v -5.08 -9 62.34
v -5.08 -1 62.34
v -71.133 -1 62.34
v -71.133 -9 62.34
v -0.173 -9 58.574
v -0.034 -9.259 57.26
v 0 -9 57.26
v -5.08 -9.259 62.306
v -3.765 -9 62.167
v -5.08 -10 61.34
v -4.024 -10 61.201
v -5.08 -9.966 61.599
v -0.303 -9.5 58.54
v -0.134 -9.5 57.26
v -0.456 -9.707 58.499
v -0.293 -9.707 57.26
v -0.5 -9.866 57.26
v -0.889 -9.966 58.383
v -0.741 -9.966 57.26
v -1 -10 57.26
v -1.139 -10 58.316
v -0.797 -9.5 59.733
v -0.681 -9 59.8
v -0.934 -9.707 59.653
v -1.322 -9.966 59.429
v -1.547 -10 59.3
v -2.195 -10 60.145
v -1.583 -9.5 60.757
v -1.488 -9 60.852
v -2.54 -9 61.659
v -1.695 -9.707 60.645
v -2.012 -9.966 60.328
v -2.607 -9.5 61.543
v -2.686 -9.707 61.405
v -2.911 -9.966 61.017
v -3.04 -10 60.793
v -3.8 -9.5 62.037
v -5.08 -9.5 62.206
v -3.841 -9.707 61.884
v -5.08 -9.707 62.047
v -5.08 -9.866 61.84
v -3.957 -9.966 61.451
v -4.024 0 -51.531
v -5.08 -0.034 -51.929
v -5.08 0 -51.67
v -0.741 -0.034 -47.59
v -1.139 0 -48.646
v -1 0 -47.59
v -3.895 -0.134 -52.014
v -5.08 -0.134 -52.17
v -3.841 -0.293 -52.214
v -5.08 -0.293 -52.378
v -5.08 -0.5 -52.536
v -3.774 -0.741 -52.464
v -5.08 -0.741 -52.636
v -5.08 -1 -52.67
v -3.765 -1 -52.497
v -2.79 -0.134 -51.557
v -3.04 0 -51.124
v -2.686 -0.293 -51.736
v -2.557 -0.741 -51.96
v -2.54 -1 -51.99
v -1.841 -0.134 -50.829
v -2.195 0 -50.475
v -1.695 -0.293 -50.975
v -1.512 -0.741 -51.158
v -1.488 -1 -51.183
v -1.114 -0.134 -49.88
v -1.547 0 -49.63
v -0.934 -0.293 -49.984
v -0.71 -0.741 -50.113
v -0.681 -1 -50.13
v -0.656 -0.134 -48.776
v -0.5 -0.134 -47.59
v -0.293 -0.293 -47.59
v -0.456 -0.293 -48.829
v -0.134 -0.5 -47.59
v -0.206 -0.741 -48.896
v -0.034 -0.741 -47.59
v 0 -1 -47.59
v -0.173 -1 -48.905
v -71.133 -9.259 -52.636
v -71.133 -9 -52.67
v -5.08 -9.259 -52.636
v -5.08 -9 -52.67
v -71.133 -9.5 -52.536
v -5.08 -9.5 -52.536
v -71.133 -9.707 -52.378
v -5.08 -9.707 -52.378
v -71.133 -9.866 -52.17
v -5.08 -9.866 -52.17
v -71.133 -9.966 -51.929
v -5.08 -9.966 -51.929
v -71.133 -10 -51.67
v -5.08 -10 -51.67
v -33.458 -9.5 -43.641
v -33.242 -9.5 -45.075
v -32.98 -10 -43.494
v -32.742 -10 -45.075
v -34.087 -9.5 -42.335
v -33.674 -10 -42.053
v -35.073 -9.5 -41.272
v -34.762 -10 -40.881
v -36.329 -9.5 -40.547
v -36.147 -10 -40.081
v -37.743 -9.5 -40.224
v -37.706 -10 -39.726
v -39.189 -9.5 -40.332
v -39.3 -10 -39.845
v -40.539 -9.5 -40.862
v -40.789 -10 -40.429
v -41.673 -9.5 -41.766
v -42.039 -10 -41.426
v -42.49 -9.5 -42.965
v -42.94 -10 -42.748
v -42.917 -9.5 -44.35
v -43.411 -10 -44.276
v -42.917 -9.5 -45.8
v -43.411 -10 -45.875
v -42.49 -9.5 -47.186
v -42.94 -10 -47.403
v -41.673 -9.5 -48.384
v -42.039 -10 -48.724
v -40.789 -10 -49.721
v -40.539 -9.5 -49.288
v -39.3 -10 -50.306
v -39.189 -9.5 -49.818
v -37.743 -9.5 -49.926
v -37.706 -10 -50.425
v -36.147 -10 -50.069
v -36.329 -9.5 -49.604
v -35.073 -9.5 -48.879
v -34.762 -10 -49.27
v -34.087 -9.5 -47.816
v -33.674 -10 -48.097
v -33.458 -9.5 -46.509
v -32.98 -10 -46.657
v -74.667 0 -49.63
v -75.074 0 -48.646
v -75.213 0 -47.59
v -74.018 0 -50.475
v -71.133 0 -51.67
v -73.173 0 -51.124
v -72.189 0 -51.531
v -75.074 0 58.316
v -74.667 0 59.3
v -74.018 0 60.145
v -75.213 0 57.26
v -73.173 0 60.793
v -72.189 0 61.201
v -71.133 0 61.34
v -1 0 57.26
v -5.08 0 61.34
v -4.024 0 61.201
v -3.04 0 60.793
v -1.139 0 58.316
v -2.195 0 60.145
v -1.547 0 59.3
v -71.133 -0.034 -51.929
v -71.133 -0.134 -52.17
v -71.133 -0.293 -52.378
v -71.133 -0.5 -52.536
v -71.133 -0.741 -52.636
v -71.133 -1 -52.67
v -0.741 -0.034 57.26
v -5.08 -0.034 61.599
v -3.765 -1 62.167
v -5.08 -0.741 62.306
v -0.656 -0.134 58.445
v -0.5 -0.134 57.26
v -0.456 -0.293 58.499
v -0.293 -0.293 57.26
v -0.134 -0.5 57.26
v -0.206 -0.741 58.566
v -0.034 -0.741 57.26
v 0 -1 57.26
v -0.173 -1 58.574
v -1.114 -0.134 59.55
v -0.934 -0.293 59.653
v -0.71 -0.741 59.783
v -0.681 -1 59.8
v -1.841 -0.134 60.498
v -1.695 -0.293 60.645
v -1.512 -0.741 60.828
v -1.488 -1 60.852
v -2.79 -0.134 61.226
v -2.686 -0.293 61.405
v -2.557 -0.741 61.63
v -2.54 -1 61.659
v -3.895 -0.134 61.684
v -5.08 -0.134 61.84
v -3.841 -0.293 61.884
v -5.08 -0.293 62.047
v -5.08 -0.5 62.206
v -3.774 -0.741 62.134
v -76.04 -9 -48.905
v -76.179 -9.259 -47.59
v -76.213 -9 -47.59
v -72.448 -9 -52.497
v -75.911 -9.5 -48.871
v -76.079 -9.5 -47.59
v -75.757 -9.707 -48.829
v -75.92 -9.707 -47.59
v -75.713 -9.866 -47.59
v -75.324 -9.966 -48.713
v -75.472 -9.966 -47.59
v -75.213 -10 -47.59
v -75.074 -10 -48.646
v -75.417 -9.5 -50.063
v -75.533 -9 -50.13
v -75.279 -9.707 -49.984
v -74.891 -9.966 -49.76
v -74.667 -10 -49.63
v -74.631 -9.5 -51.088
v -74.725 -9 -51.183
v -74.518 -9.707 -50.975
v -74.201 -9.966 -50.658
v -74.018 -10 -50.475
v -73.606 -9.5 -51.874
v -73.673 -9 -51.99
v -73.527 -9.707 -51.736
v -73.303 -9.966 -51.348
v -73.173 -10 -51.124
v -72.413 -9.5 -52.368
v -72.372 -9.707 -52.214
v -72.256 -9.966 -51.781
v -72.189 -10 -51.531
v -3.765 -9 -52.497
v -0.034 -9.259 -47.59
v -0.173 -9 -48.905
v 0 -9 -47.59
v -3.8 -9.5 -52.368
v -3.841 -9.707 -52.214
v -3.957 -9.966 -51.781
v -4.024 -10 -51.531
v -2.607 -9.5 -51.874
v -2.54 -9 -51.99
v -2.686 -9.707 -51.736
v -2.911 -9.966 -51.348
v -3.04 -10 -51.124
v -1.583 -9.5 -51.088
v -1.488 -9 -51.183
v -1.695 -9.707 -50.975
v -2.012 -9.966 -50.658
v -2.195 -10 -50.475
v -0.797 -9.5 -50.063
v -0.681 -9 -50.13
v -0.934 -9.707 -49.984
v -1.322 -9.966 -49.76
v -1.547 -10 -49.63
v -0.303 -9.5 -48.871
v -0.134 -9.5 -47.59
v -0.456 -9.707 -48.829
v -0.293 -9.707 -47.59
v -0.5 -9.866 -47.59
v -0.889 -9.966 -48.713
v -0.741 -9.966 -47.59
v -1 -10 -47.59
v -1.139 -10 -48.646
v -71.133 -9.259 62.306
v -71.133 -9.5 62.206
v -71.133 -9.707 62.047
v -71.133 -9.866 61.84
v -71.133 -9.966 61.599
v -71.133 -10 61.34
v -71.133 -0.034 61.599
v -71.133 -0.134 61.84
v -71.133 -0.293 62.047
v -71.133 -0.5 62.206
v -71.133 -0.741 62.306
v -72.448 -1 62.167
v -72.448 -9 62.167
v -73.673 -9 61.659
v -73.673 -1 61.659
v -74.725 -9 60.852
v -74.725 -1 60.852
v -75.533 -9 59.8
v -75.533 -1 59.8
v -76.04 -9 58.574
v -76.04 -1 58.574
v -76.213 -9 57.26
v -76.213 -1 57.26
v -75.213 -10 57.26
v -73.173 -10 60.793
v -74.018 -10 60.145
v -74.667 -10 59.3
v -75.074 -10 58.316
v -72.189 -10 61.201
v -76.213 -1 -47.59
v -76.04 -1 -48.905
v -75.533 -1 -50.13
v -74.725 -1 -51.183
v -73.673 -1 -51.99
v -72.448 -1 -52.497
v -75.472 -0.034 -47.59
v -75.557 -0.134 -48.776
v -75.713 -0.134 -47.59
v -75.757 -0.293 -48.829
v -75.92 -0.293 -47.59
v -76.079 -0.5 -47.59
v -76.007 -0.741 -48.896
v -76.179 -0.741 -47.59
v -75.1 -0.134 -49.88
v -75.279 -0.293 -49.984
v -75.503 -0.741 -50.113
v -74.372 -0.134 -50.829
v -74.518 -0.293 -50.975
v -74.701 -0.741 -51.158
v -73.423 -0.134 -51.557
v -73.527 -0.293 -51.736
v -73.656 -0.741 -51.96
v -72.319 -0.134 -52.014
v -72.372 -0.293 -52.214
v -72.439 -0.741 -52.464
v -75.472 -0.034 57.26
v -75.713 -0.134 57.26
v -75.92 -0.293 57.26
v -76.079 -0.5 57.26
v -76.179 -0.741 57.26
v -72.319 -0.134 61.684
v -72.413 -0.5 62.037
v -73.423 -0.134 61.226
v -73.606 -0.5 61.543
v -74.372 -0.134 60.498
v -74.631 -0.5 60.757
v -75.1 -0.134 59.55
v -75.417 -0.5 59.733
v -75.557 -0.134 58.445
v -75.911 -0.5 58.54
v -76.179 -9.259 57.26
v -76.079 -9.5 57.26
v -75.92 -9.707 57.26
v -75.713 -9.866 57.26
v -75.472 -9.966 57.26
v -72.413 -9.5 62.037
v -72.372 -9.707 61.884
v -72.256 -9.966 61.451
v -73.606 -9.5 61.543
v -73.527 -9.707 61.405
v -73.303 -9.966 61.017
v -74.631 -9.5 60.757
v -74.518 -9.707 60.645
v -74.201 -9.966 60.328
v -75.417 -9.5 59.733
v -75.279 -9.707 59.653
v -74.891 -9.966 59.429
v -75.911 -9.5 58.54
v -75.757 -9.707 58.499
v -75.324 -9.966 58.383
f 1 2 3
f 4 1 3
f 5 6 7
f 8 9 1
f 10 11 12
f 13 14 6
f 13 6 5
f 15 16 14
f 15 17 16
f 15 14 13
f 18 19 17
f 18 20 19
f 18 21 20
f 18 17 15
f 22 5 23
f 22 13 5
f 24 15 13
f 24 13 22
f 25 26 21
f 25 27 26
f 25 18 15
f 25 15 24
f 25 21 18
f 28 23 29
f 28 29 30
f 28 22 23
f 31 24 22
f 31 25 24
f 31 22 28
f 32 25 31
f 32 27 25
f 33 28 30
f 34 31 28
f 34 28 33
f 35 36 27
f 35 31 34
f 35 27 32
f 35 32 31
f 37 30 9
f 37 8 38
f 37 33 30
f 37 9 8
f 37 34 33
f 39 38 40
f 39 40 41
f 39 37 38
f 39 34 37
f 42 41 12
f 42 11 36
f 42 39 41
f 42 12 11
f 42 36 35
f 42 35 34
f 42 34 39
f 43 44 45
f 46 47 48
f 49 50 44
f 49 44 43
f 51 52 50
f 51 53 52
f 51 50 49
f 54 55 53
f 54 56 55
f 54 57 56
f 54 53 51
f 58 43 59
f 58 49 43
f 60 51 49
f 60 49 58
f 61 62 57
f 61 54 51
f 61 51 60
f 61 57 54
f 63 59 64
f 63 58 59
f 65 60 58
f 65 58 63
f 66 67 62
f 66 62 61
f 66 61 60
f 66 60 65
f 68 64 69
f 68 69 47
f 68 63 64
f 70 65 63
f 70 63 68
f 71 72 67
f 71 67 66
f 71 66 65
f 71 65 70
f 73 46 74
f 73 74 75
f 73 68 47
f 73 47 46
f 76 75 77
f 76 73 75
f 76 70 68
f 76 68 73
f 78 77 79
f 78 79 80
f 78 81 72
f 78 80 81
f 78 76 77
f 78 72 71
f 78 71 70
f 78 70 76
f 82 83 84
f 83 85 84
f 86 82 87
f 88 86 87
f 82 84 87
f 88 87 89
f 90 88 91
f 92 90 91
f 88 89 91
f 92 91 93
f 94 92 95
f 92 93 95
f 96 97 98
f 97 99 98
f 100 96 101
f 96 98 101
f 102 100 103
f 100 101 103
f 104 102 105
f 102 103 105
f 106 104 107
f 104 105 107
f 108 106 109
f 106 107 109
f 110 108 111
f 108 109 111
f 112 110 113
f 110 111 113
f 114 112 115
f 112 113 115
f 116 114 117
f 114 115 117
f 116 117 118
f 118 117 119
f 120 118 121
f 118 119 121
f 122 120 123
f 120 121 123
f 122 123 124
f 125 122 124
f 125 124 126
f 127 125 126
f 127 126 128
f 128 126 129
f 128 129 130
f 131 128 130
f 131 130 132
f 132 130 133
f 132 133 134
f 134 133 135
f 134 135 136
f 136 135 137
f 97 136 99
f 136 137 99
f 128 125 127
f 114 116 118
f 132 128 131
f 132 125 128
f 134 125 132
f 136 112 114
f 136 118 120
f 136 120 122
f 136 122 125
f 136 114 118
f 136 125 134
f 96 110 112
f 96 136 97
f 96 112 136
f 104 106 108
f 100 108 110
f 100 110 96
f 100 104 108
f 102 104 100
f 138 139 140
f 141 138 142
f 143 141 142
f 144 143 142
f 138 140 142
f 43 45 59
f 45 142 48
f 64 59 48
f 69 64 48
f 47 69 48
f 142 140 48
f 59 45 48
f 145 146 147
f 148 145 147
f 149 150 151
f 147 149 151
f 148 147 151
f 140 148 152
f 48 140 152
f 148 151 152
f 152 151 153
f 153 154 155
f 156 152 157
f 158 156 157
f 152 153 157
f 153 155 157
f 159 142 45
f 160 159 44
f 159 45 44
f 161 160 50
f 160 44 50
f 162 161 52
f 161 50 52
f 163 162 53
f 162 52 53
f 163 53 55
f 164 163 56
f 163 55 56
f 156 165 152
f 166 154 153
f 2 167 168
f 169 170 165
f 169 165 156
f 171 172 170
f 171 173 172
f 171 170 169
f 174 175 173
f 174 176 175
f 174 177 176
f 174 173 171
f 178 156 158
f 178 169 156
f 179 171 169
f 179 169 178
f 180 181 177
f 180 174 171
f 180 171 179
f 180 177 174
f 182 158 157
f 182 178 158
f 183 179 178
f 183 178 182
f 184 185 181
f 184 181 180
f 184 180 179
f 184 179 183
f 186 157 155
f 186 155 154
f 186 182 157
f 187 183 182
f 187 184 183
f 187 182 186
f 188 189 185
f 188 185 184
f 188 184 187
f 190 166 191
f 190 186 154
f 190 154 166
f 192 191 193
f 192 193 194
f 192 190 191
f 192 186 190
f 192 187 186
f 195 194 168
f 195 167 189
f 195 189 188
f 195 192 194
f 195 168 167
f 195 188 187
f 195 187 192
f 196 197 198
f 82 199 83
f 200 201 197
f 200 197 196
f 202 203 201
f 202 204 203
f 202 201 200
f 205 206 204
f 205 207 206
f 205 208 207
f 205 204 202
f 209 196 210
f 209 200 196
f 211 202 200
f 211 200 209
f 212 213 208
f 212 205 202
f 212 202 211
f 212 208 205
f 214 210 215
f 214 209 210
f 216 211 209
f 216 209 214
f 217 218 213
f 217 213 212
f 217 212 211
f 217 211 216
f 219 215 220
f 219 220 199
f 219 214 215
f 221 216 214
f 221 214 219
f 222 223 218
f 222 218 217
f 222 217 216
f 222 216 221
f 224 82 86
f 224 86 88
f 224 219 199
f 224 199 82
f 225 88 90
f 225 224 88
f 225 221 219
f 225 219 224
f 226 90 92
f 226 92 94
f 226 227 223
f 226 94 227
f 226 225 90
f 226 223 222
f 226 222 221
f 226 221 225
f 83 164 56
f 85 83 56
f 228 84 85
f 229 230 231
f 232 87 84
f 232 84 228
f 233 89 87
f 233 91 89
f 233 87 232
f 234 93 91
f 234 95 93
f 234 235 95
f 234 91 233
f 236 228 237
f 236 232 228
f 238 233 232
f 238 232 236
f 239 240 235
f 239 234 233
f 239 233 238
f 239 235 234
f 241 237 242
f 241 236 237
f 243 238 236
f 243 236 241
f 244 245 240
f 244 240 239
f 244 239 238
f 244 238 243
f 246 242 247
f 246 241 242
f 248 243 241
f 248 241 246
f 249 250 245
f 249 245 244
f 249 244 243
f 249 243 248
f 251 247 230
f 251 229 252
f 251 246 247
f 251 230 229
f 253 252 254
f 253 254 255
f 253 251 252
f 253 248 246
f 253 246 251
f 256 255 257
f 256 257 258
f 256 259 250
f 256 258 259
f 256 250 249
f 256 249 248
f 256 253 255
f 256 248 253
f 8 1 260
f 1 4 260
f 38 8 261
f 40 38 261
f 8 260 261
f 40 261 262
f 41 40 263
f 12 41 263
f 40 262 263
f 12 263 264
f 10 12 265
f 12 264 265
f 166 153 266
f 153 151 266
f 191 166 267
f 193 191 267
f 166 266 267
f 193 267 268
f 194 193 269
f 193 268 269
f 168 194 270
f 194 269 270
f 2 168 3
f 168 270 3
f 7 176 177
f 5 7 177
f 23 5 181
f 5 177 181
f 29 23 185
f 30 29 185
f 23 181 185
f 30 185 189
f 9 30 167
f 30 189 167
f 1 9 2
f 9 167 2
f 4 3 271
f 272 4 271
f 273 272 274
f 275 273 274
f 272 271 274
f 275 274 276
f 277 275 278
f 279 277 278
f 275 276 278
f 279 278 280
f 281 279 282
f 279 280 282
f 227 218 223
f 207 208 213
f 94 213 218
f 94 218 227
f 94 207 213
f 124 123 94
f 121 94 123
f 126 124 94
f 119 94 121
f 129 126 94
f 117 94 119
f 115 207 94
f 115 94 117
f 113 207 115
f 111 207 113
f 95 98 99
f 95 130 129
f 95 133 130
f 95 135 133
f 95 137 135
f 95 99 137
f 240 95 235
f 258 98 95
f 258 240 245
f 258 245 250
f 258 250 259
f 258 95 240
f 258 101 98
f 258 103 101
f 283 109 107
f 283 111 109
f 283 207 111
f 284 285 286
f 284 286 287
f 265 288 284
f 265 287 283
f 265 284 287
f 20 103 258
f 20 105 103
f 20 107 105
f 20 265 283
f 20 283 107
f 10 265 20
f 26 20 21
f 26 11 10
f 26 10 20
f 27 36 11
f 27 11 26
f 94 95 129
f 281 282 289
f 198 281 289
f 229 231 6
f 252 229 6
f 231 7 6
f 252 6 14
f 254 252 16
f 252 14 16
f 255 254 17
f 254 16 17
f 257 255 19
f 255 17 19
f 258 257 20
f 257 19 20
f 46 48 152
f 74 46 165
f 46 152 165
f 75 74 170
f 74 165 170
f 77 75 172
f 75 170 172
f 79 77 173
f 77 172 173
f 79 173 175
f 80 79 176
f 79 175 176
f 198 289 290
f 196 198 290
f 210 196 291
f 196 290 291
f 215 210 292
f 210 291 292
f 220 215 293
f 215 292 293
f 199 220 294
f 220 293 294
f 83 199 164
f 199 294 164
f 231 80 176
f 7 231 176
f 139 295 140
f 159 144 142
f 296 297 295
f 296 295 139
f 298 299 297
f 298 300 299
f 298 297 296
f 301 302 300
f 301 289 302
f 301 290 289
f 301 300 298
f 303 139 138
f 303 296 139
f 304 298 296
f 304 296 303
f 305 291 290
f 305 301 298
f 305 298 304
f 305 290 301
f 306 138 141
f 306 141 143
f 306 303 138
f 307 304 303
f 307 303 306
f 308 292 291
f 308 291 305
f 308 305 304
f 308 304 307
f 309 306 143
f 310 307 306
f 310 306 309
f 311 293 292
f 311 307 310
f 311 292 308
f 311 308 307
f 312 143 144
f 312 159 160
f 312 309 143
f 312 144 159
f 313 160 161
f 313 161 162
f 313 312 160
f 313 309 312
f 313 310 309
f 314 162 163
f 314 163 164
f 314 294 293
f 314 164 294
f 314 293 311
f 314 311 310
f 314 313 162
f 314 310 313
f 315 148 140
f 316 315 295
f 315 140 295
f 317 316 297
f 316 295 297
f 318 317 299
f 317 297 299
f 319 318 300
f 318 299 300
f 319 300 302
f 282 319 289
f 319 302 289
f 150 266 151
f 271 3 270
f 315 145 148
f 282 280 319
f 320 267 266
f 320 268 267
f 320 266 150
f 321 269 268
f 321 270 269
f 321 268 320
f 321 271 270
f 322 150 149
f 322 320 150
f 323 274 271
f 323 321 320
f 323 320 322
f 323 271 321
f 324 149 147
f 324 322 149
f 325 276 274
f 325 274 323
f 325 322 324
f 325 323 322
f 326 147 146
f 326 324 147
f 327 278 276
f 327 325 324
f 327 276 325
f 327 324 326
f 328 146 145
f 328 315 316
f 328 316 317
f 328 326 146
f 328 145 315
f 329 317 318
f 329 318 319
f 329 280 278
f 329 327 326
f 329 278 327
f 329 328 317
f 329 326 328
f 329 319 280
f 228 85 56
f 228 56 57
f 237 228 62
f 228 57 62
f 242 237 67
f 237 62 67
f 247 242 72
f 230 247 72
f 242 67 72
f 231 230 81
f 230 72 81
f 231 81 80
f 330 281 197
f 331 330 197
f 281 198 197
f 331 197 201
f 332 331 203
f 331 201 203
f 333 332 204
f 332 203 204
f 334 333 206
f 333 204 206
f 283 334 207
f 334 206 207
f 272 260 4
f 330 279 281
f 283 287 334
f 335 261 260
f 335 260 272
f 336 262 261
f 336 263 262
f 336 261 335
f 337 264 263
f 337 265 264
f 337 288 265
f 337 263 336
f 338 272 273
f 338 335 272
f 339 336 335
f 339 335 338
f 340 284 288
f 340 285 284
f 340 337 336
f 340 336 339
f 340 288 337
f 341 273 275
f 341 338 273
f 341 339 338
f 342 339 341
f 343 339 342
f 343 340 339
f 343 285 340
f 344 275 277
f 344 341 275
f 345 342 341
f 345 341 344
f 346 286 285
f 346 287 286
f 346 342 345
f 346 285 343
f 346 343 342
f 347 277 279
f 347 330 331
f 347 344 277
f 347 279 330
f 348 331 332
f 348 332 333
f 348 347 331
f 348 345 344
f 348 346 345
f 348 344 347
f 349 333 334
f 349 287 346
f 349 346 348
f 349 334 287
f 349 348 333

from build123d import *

# Parameters (mm, degrees)
F0_R     = 5.4921588255
F1_DEPTH = 10
F0_R_2   = 4.8647477
F2_DEPTH = 10
F3_SIZE  = 0.5
F4_DEPTH = 9.5
F5_R     = 1


with BuildPart() as f1:
    # F0 (on Front) → F1 (new body)
    with BuildSketch(Plane.XZ):
        with BuildLine():
            Line((-5.08, 62.3396973443), (-71.1331922889, 62.3396973443))
            ThreePointArc((-71.1331922889, 62.3396973443), (-74.7252947373, 60.8517997927), (-76.2131922889, 57.2596973443))
            Line((-76.2131922889, 57.2596973443), (-76.2131922889, -47.5904377484))
            ThreePointArc((-76.2131922889, -47.5904377484), (-74.7252947373, -51.1825401969), (-71.1331922889, -52.6704377484))
            Line((-71.1331922889, -52.6704377484), (-5.08, -52.6704377484))
            ThreePointArc((-5.08, -52.6704377484), (-1.4878975516, -51.1825401969), (0, -47.5904377484))
            Line((0, -47.5904377484), (0, 57.2596973443))
            ThreePointArc((0, 57.2596973443), (-1.4878975516, 60.8517997927), (-5.08, 62.3396973443))
        make_face()
        with Locations((-38.1065961444, -45.075263828)):
            Circle(F0_R, mode=Mode.SUBTRACT)
        with BuildLine():
            ThreePointArc((-68.5931922889, 44.5596973443), (-67.8492435131, 46.3557485685), (-66.0531922889, 47.0996973443))
            Line((-66.0531922889, 47.0996973443), (-10.16, 47.0996973443))
            ThreePointArc((-10.16, 47.0996973443), (-8.3639487758, 46.3557485685), (-7.62, 44.5596973443))
            Line((-7.62, 44.5596973443), (-7.62, -34.8904377484))
            ThreePointArc((-7.62, -34.8904377484), (-8.3639487758, -36.6864889726), (-10.16, -37.4304377484))
            Line((-10.16, -37.4304377484), (-66.0531922889, -37.4304377484))
            ThreePointArc((-66.0531922889, -37.4304377484), (-67.8492435131, -36.6864889726), (-68.5931922889, -34.8904377484))
            Line((-68.5931922889, -34.8904377484), (-68.5931922889, 44.5596973443))
        make_face(mode=Mode.SUBTRACT)
        with BuildLine():
            Line((-10.16, 47.0996973443), (-66.0531922889, 47.0996973443))
            ThreePointArc((-66.0531922889, 47.0996973443), (-67.8492435131, 46.3557485685), (-68.5931922889, 44.5596973443))
            Line((-68.5931922889, 44.5596973443), (-68.5931922889, -34.8904377484))
            ThreePointArc((-68.5931922889, -34.8904377484), (-67.8492435131, -36.6864889726), (-66.0531922889, -37.4304377484))
            Line((-66.0531922889, -37.4304377484), (-10.16, -37.4304377484))
            ThreePointArc((-10.16, -37.4304377484), (-8.3639487758, -36.6864889726), (-7.62, -34.8904377484))
            Line((-7.62, -34.8904377484), (-7.62, 44.5596973443))
            ThreePointArc((-7.62, 44.5596973443), (-8.3639487758, 46.3557485685), (-10.16, 47.0996973443))
        make_face()
    extrude(amount=F1_DEPTH)

    # F0 (on Front) → F2 (join)
    with BuildSketch(Plane.XZ):
        with Locations((-38.1065961444, -45.075263828)):
            Circle(F0_R)
        with Locations((-38.1065961444, -45.075263828)):
            Circle(F0_R_2, mode=Mode.SUBTRACT)
    extrude(amount=F2_DEPTH)

    # F3
    f3_edges = [f1.edges().sort_by_distance(p)[0] for p in [
        (-42.971344, -10, -45.075264),
    ]]
    chamfer(f3_edges, length=F3_SIZE)

    # F0 (on Front) → F4 (join)
    with BuildSketch(Plane.XZ):
        with Locations((-38.1065961444, -45.075263828)):
            Circle(F0_R_2)
    extrude(amount=F4_DEPTH)

    # F5
    f5_edges = [f1.edges().sort_by_distance(p)[0] for p in [
        (-76.213192, -10, 4.83463),
        (-74.725295, 0, 60.8518),
        (-76.213192, -5, 57.259697),
        (-76.213192, -5, -47.590438),
        (-76.213192, 0, 4.83463),
        (-71.133192, -5, 62.339697),
        (-71.133192, -5, -52.670438),
        (-74.725295, 0, -51.18254),
        (-38.106596, 0, -52.670438),
        (-38.106596, -10, -52.670438),
        (0, -5, -47.590438),
        (-5.08, -5, -52.670438),
        (0, -10, 4.83463),
        (0, 0, 4.83463),
    ]]
    fillet(f5_edges, radius=F5_R)


solid = f1.part
